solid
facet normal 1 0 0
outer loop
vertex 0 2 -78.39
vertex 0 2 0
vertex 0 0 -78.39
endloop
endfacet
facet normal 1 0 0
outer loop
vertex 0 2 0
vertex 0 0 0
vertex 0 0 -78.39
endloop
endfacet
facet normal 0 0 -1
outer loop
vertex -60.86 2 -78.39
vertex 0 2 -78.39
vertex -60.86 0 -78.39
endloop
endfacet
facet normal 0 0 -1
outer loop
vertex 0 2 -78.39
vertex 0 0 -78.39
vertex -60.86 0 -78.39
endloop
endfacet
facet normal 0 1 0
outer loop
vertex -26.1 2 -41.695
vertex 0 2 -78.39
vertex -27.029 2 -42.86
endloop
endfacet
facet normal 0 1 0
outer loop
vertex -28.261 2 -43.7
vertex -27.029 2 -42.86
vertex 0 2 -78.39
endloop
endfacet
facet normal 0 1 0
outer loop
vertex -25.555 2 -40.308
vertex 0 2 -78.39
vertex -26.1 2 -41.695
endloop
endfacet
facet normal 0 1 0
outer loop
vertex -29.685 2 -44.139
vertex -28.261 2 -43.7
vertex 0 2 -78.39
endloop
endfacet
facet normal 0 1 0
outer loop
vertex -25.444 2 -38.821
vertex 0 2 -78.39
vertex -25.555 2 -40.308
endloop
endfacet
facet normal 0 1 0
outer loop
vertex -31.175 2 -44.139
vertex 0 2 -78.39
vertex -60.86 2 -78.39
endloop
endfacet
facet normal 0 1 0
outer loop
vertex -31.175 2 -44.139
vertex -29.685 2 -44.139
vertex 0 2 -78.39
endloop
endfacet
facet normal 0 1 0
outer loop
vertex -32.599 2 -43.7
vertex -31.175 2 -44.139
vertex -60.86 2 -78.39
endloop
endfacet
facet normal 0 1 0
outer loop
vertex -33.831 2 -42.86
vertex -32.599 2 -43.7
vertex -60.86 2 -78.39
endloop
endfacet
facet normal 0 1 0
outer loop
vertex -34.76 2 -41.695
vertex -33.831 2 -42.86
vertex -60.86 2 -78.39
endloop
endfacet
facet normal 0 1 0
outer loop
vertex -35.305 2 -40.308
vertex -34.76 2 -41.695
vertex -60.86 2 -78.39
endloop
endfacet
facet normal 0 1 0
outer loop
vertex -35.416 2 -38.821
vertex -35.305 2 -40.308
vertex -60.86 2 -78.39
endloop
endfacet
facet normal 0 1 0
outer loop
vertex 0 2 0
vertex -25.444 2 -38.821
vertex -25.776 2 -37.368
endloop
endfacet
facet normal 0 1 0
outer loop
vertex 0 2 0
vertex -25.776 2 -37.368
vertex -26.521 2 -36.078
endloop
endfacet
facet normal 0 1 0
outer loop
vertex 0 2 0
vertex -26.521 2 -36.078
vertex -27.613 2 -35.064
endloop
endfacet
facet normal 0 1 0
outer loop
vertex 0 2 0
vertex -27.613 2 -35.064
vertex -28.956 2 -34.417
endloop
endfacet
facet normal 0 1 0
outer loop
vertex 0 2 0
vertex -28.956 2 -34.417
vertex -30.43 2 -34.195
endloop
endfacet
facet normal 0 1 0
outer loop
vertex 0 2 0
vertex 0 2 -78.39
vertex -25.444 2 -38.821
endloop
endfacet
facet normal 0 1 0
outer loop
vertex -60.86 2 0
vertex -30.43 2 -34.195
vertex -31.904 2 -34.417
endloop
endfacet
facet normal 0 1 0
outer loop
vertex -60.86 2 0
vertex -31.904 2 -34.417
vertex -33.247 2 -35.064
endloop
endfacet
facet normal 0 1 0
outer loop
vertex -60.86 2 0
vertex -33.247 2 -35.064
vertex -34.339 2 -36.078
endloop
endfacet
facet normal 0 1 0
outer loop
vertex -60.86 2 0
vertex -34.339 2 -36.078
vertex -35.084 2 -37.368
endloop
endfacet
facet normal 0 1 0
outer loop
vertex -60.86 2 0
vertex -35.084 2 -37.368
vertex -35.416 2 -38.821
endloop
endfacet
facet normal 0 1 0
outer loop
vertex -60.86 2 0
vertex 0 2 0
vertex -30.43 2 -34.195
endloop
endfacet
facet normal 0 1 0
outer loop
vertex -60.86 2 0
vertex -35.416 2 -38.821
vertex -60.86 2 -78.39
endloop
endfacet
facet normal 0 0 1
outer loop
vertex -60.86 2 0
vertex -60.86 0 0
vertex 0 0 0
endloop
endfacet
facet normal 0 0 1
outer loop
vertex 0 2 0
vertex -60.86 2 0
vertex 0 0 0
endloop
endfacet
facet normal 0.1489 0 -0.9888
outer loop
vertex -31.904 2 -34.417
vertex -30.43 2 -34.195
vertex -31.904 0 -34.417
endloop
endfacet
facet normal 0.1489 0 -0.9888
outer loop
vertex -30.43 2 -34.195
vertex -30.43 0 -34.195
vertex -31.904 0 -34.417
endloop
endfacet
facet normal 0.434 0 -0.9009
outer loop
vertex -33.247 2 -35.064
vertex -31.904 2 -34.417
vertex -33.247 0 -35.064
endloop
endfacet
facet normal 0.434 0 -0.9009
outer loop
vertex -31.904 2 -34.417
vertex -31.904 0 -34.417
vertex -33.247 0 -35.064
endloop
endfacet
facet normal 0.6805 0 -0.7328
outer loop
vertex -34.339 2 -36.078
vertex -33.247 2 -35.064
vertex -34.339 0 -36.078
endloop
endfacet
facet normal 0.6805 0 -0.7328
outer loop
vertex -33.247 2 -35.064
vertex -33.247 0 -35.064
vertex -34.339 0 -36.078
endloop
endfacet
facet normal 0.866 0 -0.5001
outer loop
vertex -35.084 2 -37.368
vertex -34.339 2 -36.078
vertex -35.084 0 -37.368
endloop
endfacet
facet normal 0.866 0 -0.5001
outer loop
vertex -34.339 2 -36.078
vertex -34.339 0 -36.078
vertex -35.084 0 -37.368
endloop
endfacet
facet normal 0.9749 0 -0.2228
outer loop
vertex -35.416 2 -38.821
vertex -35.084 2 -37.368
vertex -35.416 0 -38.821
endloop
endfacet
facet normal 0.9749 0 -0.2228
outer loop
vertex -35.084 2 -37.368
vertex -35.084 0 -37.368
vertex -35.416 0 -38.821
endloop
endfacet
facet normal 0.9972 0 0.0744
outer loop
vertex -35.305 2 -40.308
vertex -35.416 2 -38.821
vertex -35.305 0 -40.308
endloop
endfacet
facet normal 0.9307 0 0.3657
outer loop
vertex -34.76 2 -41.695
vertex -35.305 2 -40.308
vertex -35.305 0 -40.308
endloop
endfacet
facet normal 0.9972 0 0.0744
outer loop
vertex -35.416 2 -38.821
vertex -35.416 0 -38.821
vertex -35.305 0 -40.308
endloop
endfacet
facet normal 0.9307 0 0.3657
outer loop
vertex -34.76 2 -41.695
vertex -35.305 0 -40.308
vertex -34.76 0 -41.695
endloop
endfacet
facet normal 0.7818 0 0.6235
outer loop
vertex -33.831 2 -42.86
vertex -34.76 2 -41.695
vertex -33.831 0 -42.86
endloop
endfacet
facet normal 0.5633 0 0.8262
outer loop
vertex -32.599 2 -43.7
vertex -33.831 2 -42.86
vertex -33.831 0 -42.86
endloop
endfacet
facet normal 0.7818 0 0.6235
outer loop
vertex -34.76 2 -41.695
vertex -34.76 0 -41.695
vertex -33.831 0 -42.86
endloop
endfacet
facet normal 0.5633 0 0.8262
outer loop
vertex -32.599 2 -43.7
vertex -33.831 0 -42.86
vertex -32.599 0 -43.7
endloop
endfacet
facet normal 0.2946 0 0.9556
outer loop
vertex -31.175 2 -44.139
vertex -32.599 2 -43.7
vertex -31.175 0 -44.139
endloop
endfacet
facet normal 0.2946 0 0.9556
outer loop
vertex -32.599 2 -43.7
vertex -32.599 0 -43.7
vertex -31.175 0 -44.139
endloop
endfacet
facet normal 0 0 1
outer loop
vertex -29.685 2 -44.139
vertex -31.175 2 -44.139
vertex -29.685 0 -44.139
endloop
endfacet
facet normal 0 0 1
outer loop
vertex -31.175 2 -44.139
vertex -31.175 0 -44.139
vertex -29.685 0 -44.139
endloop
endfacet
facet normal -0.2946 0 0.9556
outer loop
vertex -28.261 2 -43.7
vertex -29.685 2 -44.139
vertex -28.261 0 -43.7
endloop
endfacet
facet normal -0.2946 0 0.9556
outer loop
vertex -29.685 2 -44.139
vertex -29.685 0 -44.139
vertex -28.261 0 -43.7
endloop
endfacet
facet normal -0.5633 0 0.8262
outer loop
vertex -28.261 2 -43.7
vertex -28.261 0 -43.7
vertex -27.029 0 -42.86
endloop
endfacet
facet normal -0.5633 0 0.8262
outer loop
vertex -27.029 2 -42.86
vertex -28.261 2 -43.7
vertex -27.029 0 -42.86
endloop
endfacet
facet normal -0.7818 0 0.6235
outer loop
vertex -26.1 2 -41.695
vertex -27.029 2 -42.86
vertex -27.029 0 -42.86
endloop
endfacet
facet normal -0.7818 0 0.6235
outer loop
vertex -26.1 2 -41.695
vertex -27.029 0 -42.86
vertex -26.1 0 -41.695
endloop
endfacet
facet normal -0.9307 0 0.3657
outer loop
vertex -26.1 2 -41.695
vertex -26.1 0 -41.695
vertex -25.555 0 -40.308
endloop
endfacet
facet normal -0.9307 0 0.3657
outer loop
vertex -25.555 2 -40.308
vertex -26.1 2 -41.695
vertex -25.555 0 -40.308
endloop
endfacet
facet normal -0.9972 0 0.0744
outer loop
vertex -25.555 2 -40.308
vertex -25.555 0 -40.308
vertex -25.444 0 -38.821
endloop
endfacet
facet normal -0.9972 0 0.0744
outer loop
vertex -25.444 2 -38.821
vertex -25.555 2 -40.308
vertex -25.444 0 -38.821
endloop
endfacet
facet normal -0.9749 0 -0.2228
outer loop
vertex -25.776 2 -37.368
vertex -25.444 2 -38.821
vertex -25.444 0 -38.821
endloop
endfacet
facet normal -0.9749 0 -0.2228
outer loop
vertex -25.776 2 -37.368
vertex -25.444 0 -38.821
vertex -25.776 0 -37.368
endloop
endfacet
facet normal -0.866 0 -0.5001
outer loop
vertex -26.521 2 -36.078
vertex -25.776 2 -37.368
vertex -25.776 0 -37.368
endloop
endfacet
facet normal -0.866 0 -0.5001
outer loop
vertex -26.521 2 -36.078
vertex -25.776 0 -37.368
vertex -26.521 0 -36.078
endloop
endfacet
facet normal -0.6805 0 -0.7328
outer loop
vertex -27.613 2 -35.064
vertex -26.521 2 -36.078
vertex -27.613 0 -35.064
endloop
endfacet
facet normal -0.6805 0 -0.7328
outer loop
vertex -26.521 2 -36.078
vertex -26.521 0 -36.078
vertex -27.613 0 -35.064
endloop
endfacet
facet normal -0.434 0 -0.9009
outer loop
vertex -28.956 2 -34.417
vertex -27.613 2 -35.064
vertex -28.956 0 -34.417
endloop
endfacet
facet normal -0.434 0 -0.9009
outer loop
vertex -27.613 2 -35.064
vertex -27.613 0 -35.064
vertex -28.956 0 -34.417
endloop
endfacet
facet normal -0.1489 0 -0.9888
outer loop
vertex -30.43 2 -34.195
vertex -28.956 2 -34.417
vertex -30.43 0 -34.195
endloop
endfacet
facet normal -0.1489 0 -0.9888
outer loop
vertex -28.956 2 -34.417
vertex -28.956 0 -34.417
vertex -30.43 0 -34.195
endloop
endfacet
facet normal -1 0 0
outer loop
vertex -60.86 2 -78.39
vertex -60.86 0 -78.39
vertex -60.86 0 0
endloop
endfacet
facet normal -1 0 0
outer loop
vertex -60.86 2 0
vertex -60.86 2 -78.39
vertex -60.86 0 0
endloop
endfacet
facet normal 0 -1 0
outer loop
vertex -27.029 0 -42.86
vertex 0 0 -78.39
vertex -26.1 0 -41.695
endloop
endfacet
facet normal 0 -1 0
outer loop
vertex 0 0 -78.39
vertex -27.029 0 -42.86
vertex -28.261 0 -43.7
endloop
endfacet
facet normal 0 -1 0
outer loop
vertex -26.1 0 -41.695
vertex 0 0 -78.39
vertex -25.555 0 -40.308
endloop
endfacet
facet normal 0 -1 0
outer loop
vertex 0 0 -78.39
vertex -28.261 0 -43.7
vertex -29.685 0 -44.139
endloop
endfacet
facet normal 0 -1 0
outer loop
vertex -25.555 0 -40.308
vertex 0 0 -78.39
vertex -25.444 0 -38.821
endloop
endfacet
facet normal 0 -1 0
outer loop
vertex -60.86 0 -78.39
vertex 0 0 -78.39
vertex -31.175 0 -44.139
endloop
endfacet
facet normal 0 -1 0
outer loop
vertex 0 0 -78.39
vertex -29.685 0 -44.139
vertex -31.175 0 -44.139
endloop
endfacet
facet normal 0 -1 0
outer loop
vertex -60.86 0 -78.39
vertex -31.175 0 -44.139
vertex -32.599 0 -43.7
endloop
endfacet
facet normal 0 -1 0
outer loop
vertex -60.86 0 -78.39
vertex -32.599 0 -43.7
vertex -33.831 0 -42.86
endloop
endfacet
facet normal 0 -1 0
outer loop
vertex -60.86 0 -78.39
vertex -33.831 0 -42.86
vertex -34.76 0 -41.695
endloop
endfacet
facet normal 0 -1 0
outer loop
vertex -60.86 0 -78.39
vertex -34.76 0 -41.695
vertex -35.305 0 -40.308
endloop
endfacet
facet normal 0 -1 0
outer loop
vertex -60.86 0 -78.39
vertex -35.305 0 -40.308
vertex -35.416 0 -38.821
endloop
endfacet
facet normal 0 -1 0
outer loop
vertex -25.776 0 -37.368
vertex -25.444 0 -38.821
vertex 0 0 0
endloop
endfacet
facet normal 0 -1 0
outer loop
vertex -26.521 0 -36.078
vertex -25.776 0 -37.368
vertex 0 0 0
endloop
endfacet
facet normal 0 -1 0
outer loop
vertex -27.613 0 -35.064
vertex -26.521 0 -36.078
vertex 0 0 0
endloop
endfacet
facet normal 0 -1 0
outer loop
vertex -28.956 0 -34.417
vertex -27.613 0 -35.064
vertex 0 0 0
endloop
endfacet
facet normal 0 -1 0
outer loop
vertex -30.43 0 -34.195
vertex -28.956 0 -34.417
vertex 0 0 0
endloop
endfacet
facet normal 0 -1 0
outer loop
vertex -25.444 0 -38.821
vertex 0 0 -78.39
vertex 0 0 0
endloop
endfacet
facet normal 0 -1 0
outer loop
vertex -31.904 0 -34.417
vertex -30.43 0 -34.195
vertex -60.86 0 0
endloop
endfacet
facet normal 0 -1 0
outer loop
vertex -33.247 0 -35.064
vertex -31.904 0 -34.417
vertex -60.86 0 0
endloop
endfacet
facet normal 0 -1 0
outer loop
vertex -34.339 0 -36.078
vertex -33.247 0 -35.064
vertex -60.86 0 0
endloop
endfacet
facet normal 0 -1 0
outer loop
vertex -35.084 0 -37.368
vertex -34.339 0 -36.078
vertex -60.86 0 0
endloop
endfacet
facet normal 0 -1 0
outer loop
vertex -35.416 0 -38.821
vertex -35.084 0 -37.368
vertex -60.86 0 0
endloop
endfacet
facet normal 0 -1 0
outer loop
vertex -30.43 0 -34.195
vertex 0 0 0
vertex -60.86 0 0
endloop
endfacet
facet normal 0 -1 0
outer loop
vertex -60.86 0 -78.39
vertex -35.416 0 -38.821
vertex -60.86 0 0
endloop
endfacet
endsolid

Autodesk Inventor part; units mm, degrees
ref_plane "YZ Plane" through (0, 0, 0) normal (1, 0, 0) x (0, 1, 0)
ref_plane "XZ Plane" through (0, 0, 0) normal (0, 1, 0) x (-1, 0, 0)
ref_plane "XY Plane" through (0, 0, 0) normal (0, 0, 1) x (1, 0, 0)
sketch "Sketch1" plane through (0, 0, 0) normal (0, 1, 0) x (-1, 0, 0)
  line L0 (60.86, 0) -> (0, 0)
  line L1 (0, 0) -> (0, -78.39)
  line L2 (0, -78.39) -> (60.86, -78.39)
  line L3 (60.86, -78.39) -> (60.86, 0)
  dimension "d0" = 78.39
  dimension "d1" = 60.86
extrude "Extrusion1" add sketch "Sketch1" along normal blind 2
sketch "Sketch2" plane through (0, 2, 0) normal (0, 1, 0) x (1, 0, 0)
  line L0 (0, 78.39) -> (-60.86, 78.39) projected
  line L1 (-60.86, 78.39) -> (-60.86, 0) projected
  point P0 (0, 0)
  point P1 (-30.43, 39.195)
  dimension "d4" = 39.195
  dimension "d5" = 30.43
hole "Hole1" at (-30.43, 2, -39.195) direction (0, -1, 0) diameter 10 end through all
properties part number "pcbProtectiveCaseTop"
